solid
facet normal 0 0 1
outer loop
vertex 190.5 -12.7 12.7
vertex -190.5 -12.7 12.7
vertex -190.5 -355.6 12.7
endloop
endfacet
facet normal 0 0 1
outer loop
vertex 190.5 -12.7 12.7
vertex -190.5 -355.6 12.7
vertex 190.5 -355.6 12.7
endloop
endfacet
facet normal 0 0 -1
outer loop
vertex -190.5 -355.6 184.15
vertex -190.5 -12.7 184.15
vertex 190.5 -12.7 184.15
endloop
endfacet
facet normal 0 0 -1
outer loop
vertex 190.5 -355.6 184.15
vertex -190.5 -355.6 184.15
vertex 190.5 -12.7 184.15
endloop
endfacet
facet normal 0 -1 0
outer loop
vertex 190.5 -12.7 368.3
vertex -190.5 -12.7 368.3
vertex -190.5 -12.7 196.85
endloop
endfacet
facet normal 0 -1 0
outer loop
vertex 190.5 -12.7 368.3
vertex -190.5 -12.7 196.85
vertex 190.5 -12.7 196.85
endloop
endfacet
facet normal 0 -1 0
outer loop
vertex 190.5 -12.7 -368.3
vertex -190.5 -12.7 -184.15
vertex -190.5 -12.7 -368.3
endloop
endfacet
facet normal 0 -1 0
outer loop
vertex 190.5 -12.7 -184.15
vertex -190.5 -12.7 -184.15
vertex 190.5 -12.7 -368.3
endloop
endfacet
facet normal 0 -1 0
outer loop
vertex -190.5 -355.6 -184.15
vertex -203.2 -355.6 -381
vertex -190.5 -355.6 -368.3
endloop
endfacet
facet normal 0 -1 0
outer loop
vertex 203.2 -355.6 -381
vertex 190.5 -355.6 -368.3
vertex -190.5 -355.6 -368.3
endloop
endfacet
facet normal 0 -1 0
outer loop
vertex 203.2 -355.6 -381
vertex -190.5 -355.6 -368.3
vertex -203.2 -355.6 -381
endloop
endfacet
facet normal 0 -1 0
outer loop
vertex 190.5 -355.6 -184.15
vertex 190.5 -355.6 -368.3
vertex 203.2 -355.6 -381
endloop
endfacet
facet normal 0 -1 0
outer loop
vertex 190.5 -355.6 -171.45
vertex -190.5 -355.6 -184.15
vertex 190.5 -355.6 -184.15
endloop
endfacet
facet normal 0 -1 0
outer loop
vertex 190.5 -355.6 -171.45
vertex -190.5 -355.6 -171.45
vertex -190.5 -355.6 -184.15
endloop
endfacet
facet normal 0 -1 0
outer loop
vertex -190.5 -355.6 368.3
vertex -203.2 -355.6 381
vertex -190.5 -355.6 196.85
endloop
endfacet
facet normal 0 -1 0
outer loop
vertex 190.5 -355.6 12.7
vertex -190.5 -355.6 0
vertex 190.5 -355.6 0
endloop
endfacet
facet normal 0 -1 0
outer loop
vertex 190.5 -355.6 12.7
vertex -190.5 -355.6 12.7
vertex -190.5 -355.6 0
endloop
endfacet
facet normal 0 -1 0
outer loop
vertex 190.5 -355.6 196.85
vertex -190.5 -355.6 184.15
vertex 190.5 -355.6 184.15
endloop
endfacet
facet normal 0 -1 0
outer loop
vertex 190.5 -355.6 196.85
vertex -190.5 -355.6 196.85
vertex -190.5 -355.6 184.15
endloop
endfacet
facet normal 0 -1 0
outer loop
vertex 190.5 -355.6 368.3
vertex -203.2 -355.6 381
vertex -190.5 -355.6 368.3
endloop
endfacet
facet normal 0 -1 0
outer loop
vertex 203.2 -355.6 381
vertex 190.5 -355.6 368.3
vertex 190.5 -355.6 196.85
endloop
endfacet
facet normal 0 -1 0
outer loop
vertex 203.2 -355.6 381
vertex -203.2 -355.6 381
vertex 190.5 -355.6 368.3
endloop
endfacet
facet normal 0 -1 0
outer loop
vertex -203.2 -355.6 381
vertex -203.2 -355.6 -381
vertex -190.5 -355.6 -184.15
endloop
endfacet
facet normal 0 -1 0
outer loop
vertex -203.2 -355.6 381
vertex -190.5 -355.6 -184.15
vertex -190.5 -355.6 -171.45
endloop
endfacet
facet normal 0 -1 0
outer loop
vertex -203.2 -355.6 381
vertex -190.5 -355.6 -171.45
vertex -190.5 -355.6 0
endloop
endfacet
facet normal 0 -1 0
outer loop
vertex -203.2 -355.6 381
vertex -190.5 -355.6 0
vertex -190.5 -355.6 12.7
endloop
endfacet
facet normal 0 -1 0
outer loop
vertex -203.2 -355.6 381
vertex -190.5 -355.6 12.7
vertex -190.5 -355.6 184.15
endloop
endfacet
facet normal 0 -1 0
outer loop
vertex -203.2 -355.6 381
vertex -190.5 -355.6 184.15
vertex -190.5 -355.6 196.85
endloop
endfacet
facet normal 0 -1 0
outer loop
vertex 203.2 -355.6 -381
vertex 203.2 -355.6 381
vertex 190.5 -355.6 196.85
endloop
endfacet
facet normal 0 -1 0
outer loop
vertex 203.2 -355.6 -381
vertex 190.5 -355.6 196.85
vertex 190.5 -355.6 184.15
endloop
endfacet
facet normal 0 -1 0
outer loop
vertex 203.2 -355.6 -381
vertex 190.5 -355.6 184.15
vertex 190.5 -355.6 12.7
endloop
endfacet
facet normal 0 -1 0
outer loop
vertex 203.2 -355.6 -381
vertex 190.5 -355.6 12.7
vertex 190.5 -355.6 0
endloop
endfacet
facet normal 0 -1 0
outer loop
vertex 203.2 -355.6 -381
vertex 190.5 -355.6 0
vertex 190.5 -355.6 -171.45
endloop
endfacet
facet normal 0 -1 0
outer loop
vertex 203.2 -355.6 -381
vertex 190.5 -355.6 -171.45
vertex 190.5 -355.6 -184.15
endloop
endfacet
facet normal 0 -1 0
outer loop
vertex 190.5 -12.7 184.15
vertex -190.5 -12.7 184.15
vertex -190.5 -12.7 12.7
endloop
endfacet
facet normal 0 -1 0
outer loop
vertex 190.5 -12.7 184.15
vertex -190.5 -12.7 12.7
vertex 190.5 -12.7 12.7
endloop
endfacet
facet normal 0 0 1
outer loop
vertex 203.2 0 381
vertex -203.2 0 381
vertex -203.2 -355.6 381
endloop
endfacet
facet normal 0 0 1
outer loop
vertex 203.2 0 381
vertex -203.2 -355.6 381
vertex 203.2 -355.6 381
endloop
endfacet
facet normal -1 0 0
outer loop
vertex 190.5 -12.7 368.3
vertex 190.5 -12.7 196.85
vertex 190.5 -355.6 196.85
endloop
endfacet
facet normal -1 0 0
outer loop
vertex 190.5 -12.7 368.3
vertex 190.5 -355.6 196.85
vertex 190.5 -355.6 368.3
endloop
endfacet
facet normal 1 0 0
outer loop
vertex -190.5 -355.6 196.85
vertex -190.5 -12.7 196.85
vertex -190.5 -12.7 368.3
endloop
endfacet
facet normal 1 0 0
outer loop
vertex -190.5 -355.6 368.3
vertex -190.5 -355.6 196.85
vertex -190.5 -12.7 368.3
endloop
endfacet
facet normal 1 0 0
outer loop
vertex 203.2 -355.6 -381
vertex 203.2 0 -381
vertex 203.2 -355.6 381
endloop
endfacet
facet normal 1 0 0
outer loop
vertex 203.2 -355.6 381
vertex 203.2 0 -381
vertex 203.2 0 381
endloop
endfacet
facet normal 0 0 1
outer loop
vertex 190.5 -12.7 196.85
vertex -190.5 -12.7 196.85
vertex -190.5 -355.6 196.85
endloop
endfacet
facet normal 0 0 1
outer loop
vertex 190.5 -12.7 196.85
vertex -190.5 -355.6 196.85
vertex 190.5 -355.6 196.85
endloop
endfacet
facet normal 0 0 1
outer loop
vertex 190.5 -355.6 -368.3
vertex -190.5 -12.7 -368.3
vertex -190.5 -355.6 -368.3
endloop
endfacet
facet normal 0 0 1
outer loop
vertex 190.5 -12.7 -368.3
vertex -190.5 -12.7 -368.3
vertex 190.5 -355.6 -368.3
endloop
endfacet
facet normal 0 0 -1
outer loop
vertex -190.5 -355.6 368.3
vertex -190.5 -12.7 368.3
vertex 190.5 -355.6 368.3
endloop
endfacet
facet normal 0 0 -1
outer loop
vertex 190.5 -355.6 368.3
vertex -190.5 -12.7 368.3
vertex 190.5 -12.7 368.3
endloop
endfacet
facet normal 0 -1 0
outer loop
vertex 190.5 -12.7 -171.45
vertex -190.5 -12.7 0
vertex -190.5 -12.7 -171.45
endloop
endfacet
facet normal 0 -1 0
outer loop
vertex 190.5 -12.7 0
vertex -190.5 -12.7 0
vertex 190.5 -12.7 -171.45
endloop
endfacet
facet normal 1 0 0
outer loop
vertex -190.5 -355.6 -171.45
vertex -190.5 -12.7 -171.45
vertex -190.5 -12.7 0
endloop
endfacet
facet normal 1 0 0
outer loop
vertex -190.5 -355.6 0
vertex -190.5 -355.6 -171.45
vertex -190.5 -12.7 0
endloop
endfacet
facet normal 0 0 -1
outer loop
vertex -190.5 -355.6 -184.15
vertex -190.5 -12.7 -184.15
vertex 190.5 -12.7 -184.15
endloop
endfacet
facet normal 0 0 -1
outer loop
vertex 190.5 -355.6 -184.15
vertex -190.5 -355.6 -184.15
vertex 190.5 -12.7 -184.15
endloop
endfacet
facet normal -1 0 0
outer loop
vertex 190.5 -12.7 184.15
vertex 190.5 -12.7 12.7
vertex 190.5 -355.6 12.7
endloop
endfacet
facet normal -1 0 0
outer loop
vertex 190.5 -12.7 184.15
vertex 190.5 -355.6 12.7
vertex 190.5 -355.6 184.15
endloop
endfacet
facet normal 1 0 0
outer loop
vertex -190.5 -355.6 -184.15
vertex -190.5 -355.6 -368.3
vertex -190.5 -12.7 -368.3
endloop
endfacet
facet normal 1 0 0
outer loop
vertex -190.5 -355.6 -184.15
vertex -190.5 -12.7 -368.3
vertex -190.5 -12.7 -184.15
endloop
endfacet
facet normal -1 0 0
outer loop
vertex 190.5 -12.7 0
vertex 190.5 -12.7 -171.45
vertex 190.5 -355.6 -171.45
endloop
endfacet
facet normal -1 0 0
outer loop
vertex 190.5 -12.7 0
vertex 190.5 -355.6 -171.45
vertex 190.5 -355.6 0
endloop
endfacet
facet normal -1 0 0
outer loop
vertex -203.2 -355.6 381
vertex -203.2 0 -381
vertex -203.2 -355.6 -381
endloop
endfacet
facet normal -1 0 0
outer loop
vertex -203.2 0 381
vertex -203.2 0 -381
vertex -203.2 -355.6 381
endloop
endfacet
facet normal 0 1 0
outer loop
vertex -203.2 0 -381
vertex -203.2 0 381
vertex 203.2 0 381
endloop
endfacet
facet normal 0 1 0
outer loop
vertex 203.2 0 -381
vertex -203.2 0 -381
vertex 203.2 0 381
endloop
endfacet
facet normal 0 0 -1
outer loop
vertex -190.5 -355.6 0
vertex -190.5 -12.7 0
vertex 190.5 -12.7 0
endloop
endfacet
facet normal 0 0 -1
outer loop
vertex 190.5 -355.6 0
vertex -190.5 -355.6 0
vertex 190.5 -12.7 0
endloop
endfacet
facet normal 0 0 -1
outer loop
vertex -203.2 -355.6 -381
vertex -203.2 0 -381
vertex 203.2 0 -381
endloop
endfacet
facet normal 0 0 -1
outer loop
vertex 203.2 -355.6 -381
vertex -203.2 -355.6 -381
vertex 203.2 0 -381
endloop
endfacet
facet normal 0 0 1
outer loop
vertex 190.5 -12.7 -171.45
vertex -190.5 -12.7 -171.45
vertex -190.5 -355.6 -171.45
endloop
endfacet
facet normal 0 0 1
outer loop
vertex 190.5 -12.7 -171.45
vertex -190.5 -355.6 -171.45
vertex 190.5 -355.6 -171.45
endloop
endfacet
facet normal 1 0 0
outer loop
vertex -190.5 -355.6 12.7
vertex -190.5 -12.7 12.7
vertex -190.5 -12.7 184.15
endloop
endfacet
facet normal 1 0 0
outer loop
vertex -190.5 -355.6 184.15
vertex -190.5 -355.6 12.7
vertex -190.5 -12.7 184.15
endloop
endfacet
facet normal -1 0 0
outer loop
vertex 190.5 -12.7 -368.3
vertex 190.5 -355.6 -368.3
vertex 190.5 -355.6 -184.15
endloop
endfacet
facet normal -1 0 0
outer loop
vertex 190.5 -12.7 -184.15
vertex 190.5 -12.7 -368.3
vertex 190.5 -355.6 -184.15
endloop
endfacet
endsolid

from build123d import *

# Parameters (mm, degrees)
F0_W     = 406.4
F0_H     = 762
F1_DEPTH = 355.6
F2_T     = -12.7
F3_W     = 381
F3_H     = 12.7
F4_DEPTH = 342.9


with BuildPart() as f1:
    # F0 (on Front) → F1 (new body)
    with BuildSketch(Plane.XZ):
        Rectangle(F0_W, F0_H)
    extrude(amount=F1_DEPTH)

    # F2
    f2_openings = [f1.faces().sort_by_distance(p)[0] for p in [
        (0, -355.6, 0),
    ]]
    offset(amount=F2_T, openings=f2_openings)

    # F3 (on face) → F4 (join)
    with BuildSketch(Plane.XZ.offset(12.7)):
        with Locations((0, 190.5)):
            Rectangle(F3_W, F3_H)
        with Locations((0, 6.35)):
            Rectangle(F3_W, F3_H)
        with Locations((0, -177.8)):
            Rectangle(F3_W, F3_H)
    extrude(amount=F4_DEPTH)


solid = f1.part
